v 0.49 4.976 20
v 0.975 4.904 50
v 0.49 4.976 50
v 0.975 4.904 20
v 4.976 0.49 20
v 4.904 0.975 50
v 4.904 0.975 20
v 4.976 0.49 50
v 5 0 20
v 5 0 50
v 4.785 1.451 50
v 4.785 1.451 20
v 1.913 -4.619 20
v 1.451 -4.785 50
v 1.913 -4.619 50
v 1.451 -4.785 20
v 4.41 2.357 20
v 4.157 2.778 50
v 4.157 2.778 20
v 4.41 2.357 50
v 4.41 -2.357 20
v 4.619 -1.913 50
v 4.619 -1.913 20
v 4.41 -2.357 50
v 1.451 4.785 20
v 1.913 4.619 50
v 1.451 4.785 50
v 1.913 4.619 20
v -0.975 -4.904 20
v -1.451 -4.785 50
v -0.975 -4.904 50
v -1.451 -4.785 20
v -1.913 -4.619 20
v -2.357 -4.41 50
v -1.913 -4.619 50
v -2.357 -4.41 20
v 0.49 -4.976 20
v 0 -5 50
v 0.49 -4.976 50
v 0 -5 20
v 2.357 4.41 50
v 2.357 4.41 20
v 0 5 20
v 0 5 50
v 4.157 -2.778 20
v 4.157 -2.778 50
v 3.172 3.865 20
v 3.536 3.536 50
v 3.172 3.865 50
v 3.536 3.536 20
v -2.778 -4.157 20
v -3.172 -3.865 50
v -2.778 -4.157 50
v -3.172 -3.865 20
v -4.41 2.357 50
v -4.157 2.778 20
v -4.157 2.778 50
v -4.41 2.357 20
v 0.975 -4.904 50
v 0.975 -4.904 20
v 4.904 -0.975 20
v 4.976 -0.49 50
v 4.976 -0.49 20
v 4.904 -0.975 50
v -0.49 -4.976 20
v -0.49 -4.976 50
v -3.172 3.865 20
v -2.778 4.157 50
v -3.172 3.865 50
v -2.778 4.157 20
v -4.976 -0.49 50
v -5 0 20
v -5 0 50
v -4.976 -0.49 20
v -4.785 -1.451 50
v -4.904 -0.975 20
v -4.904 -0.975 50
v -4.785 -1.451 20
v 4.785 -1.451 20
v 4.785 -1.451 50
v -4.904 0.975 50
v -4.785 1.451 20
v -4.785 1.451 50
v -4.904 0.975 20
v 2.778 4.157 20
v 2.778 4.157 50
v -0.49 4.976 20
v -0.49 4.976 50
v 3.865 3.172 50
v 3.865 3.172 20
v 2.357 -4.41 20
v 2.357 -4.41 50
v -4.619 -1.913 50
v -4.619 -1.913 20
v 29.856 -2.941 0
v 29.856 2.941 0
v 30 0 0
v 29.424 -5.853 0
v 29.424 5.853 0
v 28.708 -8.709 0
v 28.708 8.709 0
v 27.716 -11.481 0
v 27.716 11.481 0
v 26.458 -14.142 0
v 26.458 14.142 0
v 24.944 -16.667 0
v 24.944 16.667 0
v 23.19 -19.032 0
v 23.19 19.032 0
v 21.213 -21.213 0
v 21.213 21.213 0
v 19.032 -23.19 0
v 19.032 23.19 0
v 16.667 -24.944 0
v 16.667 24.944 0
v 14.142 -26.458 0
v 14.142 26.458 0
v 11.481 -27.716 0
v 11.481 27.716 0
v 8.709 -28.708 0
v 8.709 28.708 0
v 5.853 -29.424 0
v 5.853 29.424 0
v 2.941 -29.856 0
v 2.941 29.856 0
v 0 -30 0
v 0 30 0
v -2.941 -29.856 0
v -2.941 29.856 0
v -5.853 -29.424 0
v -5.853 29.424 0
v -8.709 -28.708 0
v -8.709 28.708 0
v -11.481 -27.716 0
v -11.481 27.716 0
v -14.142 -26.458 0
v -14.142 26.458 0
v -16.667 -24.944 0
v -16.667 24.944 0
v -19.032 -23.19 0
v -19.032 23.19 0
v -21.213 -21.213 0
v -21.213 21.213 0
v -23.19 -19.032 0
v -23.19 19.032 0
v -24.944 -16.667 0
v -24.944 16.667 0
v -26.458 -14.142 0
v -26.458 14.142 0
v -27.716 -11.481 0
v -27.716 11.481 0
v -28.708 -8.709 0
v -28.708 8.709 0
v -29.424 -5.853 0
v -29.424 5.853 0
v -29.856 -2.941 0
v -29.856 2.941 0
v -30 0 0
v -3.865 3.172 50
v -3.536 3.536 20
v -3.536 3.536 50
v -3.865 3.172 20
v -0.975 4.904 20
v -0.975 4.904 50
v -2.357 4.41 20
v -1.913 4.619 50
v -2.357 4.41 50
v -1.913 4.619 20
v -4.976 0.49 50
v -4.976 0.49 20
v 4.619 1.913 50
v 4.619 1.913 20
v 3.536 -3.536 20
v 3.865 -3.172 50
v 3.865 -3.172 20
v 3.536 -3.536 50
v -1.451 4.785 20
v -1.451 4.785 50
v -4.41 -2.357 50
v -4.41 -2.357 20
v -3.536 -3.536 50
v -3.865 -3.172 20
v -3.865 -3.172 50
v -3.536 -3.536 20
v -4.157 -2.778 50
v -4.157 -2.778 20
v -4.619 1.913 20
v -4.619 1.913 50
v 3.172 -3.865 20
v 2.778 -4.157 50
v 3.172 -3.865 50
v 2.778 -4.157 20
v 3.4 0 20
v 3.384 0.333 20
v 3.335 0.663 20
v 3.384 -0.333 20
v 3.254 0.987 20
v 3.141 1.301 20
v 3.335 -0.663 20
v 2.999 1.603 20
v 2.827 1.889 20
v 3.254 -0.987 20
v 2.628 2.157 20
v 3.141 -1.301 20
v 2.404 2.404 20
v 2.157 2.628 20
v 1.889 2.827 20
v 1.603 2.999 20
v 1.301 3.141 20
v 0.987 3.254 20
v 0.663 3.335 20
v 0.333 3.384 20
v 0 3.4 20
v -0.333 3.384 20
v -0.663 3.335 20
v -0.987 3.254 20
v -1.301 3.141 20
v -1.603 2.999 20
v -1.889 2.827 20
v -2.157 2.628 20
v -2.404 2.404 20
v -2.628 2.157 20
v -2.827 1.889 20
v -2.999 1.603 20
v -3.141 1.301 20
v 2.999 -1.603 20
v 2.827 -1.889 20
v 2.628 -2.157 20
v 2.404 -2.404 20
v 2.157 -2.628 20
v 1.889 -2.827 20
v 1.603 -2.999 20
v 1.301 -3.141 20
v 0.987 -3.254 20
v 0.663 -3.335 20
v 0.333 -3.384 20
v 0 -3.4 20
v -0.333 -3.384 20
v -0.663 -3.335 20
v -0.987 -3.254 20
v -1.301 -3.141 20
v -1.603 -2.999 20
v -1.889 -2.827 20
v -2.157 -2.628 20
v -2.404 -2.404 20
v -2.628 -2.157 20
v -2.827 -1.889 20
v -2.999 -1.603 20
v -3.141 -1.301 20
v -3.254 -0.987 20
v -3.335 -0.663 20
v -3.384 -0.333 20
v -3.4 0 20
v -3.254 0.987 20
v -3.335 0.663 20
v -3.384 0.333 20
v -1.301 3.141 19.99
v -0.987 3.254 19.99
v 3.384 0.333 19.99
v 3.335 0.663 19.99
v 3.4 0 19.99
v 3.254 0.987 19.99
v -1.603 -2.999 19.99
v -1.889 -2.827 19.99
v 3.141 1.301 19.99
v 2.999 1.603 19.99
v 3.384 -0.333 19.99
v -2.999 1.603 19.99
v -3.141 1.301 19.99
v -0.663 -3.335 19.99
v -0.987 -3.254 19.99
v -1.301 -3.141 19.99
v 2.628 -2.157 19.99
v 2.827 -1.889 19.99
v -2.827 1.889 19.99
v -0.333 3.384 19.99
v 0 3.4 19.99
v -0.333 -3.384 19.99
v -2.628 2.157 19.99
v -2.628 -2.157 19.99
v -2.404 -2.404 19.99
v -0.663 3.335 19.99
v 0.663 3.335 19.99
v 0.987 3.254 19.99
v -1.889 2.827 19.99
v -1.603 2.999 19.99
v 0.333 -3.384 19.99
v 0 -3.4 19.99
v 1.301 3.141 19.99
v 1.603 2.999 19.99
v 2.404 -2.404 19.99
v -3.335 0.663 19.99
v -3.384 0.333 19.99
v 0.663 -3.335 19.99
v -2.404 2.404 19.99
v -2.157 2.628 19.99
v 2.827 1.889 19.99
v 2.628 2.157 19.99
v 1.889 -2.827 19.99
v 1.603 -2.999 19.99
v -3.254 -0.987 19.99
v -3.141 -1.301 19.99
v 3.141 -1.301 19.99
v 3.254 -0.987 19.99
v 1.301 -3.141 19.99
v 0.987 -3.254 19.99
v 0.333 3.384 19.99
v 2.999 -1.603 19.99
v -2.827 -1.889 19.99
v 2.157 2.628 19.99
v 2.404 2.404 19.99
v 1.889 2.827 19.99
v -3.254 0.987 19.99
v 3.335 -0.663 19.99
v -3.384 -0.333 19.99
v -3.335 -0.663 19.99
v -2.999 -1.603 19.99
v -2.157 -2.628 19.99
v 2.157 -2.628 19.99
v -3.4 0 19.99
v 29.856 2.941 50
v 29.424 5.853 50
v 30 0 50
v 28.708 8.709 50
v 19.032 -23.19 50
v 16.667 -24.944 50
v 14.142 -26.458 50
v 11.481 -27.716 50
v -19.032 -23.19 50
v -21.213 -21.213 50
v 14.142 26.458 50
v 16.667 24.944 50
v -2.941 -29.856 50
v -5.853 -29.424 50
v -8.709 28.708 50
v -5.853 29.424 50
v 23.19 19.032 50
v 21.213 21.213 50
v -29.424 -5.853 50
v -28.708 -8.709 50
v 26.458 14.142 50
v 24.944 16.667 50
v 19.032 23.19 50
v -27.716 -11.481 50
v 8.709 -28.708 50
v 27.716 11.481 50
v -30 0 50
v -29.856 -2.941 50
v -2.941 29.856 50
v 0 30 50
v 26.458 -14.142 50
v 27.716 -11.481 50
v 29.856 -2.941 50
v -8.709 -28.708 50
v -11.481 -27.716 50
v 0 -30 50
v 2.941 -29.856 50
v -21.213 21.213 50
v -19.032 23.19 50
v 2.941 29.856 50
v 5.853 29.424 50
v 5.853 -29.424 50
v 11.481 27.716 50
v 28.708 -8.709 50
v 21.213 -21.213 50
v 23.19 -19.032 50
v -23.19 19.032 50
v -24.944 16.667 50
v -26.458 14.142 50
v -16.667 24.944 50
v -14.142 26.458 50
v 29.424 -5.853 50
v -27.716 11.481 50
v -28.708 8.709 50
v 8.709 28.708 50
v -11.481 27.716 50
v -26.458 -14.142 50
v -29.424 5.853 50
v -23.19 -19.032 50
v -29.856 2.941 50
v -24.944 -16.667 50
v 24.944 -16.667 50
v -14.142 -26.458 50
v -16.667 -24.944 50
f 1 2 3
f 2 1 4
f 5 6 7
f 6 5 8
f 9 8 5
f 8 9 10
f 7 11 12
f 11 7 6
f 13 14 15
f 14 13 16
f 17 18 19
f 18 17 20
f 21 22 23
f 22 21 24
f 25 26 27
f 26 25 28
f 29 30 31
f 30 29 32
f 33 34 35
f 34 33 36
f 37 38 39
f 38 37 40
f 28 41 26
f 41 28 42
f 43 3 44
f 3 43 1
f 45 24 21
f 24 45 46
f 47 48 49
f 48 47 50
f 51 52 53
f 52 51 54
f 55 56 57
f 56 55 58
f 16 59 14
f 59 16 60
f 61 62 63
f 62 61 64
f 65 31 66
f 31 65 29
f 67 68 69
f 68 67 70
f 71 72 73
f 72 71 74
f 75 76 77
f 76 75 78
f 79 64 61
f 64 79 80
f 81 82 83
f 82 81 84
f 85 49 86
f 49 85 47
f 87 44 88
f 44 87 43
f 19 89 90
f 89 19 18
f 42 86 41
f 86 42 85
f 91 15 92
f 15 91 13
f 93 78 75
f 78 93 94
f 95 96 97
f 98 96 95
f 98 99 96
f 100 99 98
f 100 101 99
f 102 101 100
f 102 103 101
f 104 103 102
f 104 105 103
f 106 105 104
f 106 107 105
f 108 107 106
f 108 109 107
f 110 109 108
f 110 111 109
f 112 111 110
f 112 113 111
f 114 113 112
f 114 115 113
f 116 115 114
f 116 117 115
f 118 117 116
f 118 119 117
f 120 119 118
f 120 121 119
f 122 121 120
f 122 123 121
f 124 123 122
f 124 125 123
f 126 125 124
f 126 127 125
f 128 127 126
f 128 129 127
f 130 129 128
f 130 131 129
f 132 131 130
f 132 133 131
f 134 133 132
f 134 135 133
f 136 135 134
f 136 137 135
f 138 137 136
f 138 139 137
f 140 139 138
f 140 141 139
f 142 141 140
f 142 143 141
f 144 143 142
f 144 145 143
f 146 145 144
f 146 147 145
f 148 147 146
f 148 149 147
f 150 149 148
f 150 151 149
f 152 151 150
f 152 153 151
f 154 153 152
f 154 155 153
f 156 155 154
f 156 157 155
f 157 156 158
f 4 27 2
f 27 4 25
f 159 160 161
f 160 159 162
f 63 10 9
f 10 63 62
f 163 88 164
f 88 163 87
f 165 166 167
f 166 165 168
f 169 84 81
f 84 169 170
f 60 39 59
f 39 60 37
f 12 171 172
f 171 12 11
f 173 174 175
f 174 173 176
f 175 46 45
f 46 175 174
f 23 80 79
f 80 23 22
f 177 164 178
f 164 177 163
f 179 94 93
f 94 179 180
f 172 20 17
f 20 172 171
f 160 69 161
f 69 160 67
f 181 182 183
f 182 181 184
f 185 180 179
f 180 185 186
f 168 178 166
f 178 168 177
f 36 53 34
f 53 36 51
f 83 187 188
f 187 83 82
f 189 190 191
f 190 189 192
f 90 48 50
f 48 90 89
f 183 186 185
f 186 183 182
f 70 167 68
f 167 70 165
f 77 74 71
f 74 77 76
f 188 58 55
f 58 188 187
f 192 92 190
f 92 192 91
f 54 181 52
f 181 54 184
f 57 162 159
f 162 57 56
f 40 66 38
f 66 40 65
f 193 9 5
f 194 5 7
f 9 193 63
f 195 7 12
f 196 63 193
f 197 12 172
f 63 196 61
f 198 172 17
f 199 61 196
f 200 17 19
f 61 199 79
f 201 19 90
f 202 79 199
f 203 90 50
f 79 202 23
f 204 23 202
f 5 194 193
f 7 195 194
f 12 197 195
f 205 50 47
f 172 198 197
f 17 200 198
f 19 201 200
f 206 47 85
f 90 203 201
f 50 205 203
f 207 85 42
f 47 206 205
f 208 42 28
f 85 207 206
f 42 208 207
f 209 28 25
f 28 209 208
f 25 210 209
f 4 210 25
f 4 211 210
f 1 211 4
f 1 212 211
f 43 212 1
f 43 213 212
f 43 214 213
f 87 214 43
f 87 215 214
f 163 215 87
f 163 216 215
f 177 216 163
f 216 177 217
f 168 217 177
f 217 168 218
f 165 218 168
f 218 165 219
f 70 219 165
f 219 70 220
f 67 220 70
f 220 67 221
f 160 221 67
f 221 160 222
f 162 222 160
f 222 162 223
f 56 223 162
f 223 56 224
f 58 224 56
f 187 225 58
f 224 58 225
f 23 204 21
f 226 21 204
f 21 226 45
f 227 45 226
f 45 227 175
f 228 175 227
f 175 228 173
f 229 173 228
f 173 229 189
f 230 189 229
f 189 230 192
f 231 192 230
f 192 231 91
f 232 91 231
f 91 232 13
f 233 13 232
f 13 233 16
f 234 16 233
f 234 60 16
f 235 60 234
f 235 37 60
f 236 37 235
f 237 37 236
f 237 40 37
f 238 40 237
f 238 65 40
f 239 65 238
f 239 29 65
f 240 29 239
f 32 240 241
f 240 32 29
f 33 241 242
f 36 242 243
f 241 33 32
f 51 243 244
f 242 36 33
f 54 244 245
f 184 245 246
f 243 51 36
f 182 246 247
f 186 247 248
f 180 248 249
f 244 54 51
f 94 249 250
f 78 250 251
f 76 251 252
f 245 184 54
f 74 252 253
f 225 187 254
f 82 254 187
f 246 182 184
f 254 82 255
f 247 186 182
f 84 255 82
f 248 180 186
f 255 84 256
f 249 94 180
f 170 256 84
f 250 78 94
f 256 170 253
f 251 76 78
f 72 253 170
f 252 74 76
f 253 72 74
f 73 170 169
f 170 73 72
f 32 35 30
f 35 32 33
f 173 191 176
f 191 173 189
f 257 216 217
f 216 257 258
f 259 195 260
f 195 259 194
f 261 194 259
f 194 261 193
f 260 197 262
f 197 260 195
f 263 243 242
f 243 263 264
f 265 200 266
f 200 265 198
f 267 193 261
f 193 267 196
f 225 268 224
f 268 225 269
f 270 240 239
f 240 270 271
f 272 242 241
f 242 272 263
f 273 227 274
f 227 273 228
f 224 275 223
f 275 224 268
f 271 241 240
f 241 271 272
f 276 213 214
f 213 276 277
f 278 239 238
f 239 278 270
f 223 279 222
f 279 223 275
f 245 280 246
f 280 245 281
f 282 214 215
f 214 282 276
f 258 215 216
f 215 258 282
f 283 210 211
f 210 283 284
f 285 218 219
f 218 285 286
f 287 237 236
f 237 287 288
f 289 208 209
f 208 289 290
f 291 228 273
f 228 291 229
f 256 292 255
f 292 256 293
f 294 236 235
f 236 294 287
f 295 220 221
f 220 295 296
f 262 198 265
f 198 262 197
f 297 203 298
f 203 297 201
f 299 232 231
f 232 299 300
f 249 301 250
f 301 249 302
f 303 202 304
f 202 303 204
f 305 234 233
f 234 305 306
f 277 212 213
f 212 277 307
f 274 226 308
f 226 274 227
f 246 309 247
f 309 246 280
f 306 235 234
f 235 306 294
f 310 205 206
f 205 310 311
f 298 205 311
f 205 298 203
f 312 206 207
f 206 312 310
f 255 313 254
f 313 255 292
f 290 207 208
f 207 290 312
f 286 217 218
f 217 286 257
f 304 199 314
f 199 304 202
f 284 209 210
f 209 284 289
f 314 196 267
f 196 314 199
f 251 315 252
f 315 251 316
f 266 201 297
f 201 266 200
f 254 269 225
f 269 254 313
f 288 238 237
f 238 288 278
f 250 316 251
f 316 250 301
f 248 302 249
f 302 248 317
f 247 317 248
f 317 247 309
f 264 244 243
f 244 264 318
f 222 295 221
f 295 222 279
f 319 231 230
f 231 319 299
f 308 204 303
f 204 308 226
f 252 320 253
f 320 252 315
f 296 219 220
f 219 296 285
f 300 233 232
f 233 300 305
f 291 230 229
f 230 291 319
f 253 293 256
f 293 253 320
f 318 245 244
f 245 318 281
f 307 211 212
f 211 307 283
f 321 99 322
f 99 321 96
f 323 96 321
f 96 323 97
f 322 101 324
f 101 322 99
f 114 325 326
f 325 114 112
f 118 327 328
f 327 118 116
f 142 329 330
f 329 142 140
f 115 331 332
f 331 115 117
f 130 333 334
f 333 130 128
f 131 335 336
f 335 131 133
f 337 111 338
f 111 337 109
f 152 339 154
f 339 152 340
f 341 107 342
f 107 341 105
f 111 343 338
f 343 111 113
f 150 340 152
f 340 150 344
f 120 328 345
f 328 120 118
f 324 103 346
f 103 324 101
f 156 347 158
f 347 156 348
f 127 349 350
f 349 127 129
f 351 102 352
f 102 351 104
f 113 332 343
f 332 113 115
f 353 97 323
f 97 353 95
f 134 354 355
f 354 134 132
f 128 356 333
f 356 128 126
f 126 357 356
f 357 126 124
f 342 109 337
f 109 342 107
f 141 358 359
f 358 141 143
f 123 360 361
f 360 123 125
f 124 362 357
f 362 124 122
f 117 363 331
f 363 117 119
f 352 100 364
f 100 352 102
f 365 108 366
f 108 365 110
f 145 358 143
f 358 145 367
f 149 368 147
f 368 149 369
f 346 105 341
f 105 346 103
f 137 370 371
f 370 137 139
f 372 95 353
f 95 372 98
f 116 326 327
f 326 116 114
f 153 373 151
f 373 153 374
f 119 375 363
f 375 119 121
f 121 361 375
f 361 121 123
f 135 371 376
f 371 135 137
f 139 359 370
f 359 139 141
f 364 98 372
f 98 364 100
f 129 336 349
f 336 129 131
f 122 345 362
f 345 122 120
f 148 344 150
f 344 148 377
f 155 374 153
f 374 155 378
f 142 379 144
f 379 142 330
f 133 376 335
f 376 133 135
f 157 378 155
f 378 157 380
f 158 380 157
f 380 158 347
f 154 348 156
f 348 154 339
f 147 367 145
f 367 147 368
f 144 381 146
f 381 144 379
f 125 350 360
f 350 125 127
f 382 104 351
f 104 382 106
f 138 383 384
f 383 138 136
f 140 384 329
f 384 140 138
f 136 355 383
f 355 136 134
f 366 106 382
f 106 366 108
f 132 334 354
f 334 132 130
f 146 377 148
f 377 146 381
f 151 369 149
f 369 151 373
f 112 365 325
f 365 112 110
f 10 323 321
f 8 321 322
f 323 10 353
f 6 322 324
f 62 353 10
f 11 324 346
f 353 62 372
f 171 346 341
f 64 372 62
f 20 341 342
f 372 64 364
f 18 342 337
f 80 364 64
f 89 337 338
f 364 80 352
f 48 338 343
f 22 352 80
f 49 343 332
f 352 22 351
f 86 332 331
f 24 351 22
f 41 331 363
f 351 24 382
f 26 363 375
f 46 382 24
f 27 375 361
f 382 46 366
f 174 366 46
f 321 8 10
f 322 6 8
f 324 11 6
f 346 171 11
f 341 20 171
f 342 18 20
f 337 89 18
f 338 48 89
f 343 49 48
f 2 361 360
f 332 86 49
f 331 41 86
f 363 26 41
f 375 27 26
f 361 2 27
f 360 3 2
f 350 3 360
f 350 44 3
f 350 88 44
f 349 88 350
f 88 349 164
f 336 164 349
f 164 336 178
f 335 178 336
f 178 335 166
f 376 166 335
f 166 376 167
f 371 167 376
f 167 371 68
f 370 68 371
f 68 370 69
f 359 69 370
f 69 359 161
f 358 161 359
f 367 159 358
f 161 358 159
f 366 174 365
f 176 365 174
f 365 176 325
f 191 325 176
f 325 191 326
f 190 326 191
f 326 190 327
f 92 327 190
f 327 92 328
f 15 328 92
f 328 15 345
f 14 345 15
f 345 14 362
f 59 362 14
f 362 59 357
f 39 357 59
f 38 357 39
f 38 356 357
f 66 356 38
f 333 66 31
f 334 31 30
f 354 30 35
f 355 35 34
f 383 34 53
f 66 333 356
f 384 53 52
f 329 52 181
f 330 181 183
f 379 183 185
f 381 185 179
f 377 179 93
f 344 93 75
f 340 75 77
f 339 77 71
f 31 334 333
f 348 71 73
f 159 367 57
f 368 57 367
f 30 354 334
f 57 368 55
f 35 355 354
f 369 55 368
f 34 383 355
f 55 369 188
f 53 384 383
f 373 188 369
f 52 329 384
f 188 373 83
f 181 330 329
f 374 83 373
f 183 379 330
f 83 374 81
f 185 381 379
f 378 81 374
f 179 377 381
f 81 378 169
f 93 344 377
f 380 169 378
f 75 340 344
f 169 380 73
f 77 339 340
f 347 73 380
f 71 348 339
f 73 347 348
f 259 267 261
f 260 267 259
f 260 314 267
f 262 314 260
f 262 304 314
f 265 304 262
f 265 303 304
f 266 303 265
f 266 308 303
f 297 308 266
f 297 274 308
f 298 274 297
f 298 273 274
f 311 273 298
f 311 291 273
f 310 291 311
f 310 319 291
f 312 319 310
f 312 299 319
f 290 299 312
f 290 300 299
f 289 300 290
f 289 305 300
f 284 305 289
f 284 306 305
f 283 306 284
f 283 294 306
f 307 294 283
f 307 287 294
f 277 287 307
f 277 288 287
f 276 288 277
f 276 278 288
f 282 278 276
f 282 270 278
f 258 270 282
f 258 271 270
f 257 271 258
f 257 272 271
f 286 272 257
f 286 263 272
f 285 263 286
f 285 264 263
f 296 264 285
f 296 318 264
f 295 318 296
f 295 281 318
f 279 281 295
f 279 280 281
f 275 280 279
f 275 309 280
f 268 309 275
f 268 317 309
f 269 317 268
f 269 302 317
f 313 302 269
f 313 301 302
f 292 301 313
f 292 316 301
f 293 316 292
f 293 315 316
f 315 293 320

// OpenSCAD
// Funnel with spout - printed upright, wide opening at the top
// Units: mm. Wall thickness 1.6 mm throughout.

// ---------- Parameters ----------
spout_d        = 10;    // spout outer diameter
spout_bore     = spout_d - 2 * 1.6;  // spout bore (6.8 mm)
spout_len      = 20;    // spout length (z = 0 to 20)
cone_top_d     = 10;    // cone outer diameter at z = 20 (top of spout)
cone_rim_d     = 60;    // cone outer diameter at rim (z = 50)
cone_h         = cone_rim_d - cone_top_d;  // cone height (40 mm)
eps            = 0.5;   // cutter overshoot past faces

$fn = 64;

// ---------- Model ----------
union() {
    // Spout: tube from z = 0 to z = 20
    difference() {
        cylinder(d = spout_d, h = spout_len);
        translate([0, 0, -eps])
            cylinder(d = spout_bore, h = spout_len + 2 * eps);
    }

    // Cone: widens from 10 mm at z = 20 to 60 mm at z = 50
    difference() {
        cylinder(d = cone_rim_d, h = cone_h, $fn = 64);
        translate([0, 0, spout_len - 0.01])
            cylinder(d = cone_top_d, h = cone_h + 0.01, $fn = 64);
    }
}
